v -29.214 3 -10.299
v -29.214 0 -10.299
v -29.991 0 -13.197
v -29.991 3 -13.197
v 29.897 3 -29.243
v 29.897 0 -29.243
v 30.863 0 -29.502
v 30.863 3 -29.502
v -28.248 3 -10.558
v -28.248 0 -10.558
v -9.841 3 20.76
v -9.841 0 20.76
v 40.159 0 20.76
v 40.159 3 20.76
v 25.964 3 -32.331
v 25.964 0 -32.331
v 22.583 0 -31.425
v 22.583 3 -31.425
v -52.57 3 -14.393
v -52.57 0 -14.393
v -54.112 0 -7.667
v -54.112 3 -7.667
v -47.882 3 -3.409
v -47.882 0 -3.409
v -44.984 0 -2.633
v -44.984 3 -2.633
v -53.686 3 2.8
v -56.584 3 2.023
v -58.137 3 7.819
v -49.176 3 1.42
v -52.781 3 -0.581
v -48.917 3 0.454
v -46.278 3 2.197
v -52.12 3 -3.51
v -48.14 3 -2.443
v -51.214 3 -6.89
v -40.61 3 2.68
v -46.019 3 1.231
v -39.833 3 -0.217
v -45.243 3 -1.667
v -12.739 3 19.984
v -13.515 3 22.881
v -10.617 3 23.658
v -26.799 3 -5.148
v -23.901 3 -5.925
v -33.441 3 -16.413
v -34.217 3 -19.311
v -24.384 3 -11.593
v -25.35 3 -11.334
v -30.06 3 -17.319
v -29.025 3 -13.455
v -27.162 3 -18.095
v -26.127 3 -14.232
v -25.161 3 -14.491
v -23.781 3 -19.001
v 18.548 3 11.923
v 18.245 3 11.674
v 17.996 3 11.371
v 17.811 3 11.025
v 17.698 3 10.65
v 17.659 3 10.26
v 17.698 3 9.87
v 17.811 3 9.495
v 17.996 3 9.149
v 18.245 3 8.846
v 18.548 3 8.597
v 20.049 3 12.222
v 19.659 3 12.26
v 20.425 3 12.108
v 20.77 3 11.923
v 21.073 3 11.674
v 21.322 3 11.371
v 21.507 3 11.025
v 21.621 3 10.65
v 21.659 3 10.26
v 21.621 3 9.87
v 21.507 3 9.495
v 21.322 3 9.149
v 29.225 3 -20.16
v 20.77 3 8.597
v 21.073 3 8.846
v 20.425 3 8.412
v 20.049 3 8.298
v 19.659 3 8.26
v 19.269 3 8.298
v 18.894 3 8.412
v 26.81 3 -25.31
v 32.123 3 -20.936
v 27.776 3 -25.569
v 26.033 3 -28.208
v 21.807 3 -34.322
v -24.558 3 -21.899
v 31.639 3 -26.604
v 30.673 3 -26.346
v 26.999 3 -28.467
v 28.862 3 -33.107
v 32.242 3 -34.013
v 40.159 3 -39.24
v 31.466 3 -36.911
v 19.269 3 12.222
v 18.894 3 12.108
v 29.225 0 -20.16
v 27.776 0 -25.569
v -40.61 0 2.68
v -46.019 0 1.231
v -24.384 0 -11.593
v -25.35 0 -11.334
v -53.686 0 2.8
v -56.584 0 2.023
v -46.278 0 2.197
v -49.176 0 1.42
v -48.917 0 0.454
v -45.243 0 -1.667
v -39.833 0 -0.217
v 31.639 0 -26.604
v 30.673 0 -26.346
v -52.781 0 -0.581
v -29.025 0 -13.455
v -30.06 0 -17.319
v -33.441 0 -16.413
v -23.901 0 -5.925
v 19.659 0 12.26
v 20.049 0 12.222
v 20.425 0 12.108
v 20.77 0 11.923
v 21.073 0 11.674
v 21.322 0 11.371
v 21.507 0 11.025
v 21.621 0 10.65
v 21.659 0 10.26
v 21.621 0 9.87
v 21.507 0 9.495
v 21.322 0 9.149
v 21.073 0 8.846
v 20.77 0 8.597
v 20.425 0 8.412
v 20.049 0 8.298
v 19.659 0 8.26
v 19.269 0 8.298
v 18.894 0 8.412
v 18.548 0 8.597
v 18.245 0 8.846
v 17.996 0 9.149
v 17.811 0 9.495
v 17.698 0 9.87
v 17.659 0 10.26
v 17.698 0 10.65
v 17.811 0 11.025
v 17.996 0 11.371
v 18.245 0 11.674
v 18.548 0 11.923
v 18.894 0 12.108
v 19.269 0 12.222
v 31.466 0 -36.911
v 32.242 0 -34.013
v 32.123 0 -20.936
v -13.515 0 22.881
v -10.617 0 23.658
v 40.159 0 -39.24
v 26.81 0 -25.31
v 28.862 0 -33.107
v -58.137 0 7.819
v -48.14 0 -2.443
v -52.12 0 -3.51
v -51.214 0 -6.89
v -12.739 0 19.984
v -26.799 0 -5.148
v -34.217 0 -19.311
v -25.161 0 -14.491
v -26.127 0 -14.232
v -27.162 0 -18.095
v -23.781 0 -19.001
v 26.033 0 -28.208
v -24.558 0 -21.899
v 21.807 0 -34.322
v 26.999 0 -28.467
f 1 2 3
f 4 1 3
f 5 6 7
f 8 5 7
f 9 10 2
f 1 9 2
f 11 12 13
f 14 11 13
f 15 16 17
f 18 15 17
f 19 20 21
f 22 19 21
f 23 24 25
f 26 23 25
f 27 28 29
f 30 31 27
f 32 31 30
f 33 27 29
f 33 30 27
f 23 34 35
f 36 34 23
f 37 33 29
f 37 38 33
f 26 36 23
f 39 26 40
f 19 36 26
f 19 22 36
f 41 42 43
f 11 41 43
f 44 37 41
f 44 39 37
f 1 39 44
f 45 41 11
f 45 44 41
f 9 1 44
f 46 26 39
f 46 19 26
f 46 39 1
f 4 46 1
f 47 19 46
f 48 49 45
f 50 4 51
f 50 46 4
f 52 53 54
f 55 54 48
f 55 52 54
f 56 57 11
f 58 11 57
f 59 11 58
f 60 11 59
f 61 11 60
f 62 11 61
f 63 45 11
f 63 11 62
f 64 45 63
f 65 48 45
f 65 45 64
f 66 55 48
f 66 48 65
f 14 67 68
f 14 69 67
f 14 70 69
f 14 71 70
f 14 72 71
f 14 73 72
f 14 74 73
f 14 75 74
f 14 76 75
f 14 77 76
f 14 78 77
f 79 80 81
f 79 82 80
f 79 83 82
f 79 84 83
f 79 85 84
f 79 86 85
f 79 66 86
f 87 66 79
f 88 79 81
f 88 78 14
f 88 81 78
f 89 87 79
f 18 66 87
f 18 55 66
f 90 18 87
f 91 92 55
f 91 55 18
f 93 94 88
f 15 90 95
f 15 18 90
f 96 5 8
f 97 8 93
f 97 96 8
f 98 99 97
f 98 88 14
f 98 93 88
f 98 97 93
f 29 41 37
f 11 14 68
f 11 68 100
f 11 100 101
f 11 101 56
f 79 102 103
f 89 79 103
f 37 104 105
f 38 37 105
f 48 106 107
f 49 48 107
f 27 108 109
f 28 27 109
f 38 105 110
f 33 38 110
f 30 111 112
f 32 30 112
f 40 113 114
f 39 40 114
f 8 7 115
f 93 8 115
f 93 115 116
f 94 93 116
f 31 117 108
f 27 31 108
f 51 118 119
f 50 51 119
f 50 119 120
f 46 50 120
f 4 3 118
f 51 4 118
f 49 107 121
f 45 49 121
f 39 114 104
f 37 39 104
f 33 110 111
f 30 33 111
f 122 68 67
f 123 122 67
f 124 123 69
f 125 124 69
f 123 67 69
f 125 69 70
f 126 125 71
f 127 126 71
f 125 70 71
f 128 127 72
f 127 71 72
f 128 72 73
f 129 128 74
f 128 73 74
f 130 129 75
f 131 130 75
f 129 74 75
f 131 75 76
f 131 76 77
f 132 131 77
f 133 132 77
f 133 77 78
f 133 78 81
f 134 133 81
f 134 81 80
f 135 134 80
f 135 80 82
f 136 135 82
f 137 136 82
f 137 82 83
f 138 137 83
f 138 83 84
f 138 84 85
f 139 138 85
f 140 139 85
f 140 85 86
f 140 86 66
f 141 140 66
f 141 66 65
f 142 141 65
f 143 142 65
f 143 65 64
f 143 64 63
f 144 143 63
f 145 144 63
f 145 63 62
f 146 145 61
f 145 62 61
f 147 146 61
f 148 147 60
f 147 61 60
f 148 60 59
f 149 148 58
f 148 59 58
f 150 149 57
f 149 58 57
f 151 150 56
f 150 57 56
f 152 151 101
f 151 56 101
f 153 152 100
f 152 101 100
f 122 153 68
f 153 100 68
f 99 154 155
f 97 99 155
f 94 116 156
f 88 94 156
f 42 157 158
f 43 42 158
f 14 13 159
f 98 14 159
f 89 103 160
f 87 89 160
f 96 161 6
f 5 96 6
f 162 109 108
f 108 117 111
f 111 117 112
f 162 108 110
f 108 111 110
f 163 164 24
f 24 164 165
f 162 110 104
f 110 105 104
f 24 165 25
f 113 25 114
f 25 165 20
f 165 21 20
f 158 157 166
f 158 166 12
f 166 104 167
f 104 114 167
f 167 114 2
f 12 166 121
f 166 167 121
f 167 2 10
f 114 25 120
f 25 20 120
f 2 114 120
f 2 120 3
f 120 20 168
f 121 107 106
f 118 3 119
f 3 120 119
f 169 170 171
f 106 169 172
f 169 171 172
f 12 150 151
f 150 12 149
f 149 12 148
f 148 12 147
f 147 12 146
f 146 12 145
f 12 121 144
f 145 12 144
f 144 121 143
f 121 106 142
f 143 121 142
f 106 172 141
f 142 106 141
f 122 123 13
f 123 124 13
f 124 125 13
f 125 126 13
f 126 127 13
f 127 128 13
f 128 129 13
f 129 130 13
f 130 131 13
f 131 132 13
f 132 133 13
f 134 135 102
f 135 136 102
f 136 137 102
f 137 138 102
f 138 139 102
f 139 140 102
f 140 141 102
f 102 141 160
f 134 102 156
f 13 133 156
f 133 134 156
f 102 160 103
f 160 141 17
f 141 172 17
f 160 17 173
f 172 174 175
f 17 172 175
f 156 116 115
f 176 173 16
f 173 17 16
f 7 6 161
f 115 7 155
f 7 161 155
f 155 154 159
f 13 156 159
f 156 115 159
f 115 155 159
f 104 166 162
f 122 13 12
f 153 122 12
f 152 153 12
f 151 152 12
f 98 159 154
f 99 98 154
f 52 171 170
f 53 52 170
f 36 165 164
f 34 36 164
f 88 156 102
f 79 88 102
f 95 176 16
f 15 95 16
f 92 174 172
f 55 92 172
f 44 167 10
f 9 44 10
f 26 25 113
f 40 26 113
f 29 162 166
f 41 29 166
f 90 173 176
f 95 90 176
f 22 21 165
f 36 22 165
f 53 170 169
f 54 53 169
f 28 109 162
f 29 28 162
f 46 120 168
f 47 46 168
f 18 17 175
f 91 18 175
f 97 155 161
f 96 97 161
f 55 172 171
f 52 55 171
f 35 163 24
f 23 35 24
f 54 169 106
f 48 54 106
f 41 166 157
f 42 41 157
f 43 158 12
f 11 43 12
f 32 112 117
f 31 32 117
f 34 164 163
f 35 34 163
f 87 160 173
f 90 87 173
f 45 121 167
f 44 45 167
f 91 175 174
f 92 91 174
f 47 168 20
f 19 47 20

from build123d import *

# Parameters (mm, degrees)
EXTRUDE_1_DEPTH     = 3
SKETCH_2_R          = 2
CUT_EXTRUDE_1_DEPTH = 71.204680691


with BuildPart() as part:
    # 草图1 → 凸台-拉伸1 (new body)
    with BuildSketch(Plane(origin=(0, 0, 0), x_dir=(1, 0, 0), z_dir=(0, 1, 0))):
        Polygon((31.465896135, 36.910648046), (32.24235327, 34.012870567), (28.861612878, 33.107003909), (29.896889059, 29.243300604), (30.862814885, 29.502119649), (31.63927202, 26.604342171), (30.673346194, 26.345523125), (32.122732847, 20.936338498), (29.224955368, 20.159881363), (27.775568715, 25.56906599), (26.809642889, 25.310246945), (26.033185754, 28.208024424), (26.99911158, 28.466843469), (25.9638354, 32.330546774), (22.583095008, 31.424680116), (21.806637872, 34.322457595), (-24.55780179, 21.89914343), (-23.781344654, 19.001365951), (-27.162085046, 18.095499294), (-26.126808866, 14.231795988), (-25.16088304, 14.490615033), (-24.384425904, 11.592837555), (-25.350351731, 11.334018509), (-23.900965078, 5.924833882), (-26.798742557, 5.148376747), (-28.248129209, 10.557561374), (-29.214055036, 10.298742329), (-29.990512171, 13.196519808), (-29.024586345, 13.455338853), (-30.059862525, 17.319042158), (-33.440602917, 16.4131755), (-34.217060053, 19.310952979), (-52.569650752, 14.393391122), (-54.11186912, 7.666843213), (-51.214091641, 6.890386078), (-52.119958299, 3.509645686), (-48.140343895, 2.44331122), (-47.88152485, 3.409237046), (-44.983747371, 2.632779911), (-45.242566416, 1.666854085), (-39.833381789, 0.217467432), (-40.609838924, -2.680310047), (-46.019023551, -1.230923394), (-46.277842596, -2.19684922), (-49.175620075, -1.420392085), (-48.91680103, -0.454466259), (-52.780504335, 0.580809922), (-53.686370993, -2.79993047), (-56.584148472, -2.023473335), (-58.137062743, -7.819028293), (-12.738548907, -19.983523413), (-13.515006042, -22.881300891), (-10.617228564, -23.657758027), (-9.840771428, -20.759980548), (40.159228572, -20.759980548), (40.159228572, 39.240019452), align=None)
    extrude(amount=EXTRUDE_1_DEPTH)

    # 草图2 → 切除-拉伸1 (cut, through all)
    with BuildSketch(Plane(origin=(0, 3, 0), x_dir=(1, 0, 0), z_dir=(0, 1, 0))):
        with Locations(Location((19.659228572, -10.259980548, 0), (0, 0, 270))):
            Circle(SKETCH_2_R)
    extrude(amount=-CUT_EXTRUDE_1_DEPTH, mode=Mode.SUBTRACT)


solid = part.part
